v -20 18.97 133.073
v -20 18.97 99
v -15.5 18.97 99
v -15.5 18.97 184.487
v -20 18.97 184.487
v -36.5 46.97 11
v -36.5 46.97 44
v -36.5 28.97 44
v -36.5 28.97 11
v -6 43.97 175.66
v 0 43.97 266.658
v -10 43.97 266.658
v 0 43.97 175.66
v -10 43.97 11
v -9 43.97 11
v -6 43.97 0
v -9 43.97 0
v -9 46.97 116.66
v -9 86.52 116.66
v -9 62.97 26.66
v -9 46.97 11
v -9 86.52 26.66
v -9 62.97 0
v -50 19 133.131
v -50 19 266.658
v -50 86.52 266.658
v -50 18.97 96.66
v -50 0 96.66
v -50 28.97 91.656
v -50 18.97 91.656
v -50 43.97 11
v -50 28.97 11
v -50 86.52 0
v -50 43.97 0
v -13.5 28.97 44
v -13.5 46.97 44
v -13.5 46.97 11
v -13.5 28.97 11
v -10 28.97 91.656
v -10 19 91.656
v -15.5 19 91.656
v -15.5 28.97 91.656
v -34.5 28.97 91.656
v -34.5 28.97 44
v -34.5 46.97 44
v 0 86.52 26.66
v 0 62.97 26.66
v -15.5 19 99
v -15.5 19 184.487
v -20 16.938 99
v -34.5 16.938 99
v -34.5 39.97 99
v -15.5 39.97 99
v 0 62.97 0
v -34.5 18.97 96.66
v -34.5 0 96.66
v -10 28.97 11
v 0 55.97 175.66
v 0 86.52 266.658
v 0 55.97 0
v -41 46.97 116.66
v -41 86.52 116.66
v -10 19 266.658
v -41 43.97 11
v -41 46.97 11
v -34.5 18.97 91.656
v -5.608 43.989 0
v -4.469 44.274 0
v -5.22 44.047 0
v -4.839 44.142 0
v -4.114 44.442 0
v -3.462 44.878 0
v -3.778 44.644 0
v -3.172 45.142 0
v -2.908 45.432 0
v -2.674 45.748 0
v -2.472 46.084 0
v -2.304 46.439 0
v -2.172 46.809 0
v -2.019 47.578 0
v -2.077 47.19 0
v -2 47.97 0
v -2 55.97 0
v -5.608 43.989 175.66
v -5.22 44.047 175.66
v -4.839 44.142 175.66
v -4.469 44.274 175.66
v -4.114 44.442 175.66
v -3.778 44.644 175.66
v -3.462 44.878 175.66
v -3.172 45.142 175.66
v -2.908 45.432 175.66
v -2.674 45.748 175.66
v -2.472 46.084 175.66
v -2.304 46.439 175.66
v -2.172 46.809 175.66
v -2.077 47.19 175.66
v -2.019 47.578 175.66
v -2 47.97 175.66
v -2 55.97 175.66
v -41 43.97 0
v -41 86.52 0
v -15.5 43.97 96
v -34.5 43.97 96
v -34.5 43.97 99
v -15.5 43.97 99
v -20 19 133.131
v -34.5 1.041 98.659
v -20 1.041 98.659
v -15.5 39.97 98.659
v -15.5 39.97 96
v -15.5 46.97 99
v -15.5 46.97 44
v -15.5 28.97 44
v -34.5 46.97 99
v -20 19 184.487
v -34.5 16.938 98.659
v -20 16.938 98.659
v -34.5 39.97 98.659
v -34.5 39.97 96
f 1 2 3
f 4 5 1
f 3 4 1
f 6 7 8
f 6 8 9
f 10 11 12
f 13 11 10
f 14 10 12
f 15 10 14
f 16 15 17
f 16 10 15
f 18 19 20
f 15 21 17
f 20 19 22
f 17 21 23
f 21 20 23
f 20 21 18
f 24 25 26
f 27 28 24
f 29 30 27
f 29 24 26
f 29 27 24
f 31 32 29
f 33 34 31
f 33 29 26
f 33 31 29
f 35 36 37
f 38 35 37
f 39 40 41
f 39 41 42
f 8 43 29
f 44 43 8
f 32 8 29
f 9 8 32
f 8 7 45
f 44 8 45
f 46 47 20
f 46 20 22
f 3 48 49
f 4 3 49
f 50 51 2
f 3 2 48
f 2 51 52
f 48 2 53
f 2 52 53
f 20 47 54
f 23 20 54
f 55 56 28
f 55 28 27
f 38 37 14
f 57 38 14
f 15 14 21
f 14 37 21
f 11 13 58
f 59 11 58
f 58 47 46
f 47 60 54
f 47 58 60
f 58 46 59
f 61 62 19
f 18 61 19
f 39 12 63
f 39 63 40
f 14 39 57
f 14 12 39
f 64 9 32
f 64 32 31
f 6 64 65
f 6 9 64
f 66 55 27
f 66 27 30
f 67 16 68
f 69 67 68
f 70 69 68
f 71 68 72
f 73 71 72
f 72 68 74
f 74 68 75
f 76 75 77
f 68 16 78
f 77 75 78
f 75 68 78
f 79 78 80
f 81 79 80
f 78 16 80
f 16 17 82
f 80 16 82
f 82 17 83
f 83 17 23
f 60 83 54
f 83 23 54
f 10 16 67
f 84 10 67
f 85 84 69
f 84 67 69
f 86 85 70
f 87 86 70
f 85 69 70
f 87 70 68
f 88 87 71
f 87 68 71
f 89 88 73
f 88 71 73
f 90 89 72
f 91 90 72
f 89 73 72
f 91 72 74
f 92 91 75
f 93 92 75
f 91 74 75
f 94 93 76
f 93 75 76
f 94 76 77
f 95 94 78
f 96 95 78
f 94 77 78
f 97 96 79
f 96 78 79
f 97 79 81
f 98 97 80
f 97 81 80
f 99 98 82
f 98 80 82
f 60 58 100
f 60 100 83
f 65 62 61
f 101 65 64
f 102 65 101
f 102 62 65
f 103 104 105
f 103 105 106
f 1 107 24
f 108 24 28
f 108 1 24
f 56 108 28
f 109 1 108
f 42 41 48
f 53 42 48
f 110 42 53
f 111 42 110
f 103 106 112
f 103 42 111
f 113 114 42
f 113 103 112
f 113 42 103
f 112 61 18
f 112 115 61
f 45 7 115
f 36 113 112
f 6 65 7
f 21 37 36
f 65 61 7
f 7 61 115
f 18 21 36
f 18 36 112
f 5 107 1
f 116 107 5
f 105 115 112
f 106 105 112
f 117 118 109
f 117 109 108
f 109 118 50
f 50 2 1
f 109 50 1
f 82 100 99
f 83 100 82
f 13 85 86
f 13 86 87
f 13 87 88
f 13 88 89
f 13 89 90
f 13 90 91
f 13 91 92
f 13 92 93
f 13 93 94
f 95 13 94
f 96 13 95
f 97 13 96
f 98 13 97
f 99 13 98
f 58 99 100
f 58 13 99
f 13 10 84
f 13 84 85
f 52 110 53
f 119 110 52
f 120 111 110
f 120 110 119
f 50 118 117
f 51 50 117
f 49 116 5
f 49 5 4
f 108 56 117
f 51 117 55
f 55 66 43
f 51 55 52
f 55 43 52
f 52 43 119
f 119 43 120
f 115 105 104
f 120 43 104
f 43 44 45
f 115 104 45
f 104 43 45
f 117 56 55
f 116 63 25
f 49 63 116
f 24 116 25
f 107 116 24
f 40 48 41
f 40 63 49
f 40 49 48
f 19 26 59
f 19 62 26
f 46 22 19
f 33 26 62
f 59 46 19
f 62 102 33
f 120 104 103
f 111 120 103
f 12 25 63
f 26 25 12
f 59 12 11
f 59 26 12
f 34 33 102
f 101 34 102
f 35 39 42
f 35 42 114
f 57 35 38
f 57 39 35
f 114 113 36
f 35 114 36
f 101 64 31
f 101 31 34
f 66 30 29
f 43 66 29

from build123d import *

# Parameters (mm, degrees)
SKETCH1_W           = 50
SKETCH1_H           = 86.52
BOSS_EXTRUDE1_DEPTH = 266.658
SKETCH2_W           = 32
SKETCH2_H           = 116.66
CUT_EXTRUDE1_DEPTH  = 39.55
SKETCH3_W           = 32
SKETCH3_H           = 11
CUT_EXTRUDE2_DEPTH  = 276.341006506
SKETCH4_W           = 23
SKETCH4_H           = 33
CUT_EXTRUDE3_DEPTH  = 276.341006506
SKETCH5_W           = 19
SKETCH5_H           = 52
CUT_EXTRUDE4_DEPTH  = 276.341006506
SKETCH6_W           = 19
SKETCH6_H           = 3
CUT_EXTRUDE5_DEPTH  = 3
SKETCH7_W           = 26.66
SKETCH7_H           = 23.55
CUT_EXTRUDE6_DEPTH  = 11
SKETCH8_W           = 96.66
SKETCH8_H           = 18.97
CUT_EXTRUDE7_DEPTH  = 285.76692112
SKETCH9_W           = 80.656
SKETCH9_H           = 10
CUT_EXTRUDE8_DEPTH  = 285.76692112
SKETCH10_W          = 11
SKETCH10_H          = 25
CUT_EXTRUDE9_DEPTH  = 285.76692112
SKETCH11_W          = 175.66
SKETCH11_H          = 55.97
CUT_EXTRUDE10_DEPTH = 2
SKETCH12_W          = 266.658
SKETCH12_H          = 59.418393815
CUT_EXTRUDE11_DEPTH = 10
FILLET2_R           = 4
SKETCH13_W          = 19
SKETCH13_H          = 48.117373491
CUT_EXTRUDE12_DEPTH = 2.659
SKETCH16_W          = 19
SKETCH16_H          = 23.032
CUT_EXTRUDE13_DEPTH = 0.341
CUT_EXTRUDE14_DEPTH = 284.182272334
CUT_EXTRUDE15_DEPTH = 10
SKETCH22_W          = 5.5
SKETCH22_H          = 5.004
CUT_EXTRUDE16_DEPTH = 0.03
SKETCH24_W          = 4.5
SKETCH24_H          = 85.486763268
BOSS_EXTRUDE2_DEPTH = 0.03


with BuildPart() as part:
    # Sketch1 → Boss-Extrude1 (new body)
    with BuildSketch(Plane.XY):
        with Locations((-25, 43.26)):
            Rectangle(SKETCH1_W, SKETCH1_H)
    extrude(amount=BOSS_EXTRUDE1_DEPTH)

    # Sketch2 → Cut-Extrude1 (cut)
    with BuildSketch(Plane(origin=(0, 86.52, 0), x_dir=(1, 0, 0), z_dir=(0, 1, 0))):
        with Locations((-25, -58.33)):
            Rectangle(SKETCH2_W, SKETCH2_H)
    extrude(amount=-CUT_EXTRUDE1_DEPTH, mode=Mode.SUBTRACT)

    # Sketch3 → Cut-Extrude2 (cut, through all)
    with BuildSketch(Plane(origin=(0, 46.97, 0), x_dir=(1, 0, 0), z_dir=(0, 1, 0))):
        with Locations((-25, -5.5)):
            Rectangle(SKETCH3_W, SKETCH3_H)
    extrude(amount=-CUT_EXTRUDE2_DEPTH, mode=Mode.SUBTRACT)

    # Sketch4 → Cut-Extrude3 (cut, through all)
    with BuildSketch(Plane(origin=(0, 46.97, 0), x_dir=(1, 0, 0), z_dir=(0, 1, 0))):
        with Locations((-25, -27.5)):
            Rectangle(SKETCH4_W, SKETCH4_H)
    extrude(amount=-CUT_EXTRUDE3_DEPTH, mode=Mode.SUBTRACT)

    # Sketch5 → Cut-Extrude4 (cut, through all)
    with BuildSketch(Plane(origin=(0, 46.97, 0), x_dir=(1, 0, 0), z_dir=(0, 1, 0))):
        with Locations((-25, -70)):
            Rectangle(SKETCH5_W, SKETCH5_H)
    extrude(amount=-CUT_EXTRUDE4_DEPTH, mode=Mode.SUBTRACT)

    # Sketch6 → Cut-Extrude5 (cut)
    with BuildSketch(Plane(origin=(0, 46.97, 0), x_dir=(1, 0, 0), z_dir=(0, 1, 0))):
        with Locations((-25, -97.5)):
            Rectangle(SKETCH6_W, SKETCH6_H)
    extrude(amount=-CUT_EXTRUDE5_DEPTH, mode=Mode.SUBTRACT)

    # Sketch7 → Cut-Extrude6 (cut)
    with BuildSketch(Plane(origin=(0, 0, 0), x_dir=(0, 0, -1), z_dir=(1, 0, 0))):
        with Locations((-13.33, 74.745)):
            Rectangle(SKETCH7_W, SKETCH7_H)
    extrude(amount=-CUT_EXTRUDE6_DEPTH, mode=Mode.SUBTRACT)

    # Sketch8 → Cut-Extrude7 (cut, through all)
    with BuildSketch(Plane(origin=(0, 0, 0), x_dir=(0, 0, -1), z_dir=(1, 0, 0))):
        with Locations((-48.33, 9.485)):
            Rectangle(SKETCH8_W, SKETCH8_H)
    extrude(amount=-CUT_EXTRUDE7_DEPTH, mode=Mode.SUBTRACT)

    # Sketch9 → Cut-Extrude8 (cut, through all)
    with BuildSketch(Plane(origin=(0, 0, 0), x_dir=(0, 0, -1), z_dir=(1, 0, 0))):
        with Locations((-51.328, 23.97)):
            Rectangle(SKETCH9_W, SKETCH9_H)
    extrude(amount=-CUT_EXTRUDE8_DEPTH, mode=Mode.SUBTRACT)

    # Sketch10 → Cut-Extrude9 (cut, through all)
    with BuildSketch(Plane(origin=(0, 0, 0), x_dir=(0, 0, -1), z_dir=(1, 0, 0))):
        with Locations((-5.5, 31.47)):
            Rectangle(SKETCH10_W, SKETCH10_H)
    extrude(amount=-CUT_EXTRUDE9_DEPTH, mode=Mode.SUBTRACT)

    # Sketch11 → Cut-Extrude10 (cut)
    with BuildSketch(Plane(origin=(0, 0, 0), x_dir=(0, 0, -1), z_dir=(1, 0, 0))):
        with Locations((-87.83, 27.985)):
            Rectangle(SKETCH11_W, SKETCH11_H)
    extrude(amount=-CUT_EXTRUDE10_DEPTH, mode=Mode.SUBTRACT)

    # Sketch12 → Cut-Extrude11 (cut)
    with BuildSketch(Plane(origin=(0, 0, 0), x_dir=(0, 0, -1), z_dir=(1, 0, 0))):
        with Locations((-133.329, 14.260803093)):
            Rectangle(SKETCH12_W, SKETCH12_H)
    extrude(amount=-CUT_EXTRUDE11_DEPTH, mode=Mode.SUBTRACT)

    # Fillet2
    fillet2_edges = [part.edges().sort_by_distance(p)[0] for p in [
        (-2, 43.97, 87.83),
    ]]
    fillet(fillet2_edges, radius=FILLET2_R)

    # Sketch13 → Cut-Extrude12 (cut)
    with BuildSketch(Plane(origin=(0, 0, 96), x_dir=(-1, 0, 0), z_dir=(0, 0, -1))):
        with Locations((25, 15.911313255)):
            Rectangle(SKETCH13_W, SKETCH13_H)
    extrude(amount=-CUT_EXTRUDE12_DEPTH, mode=Mode.SUBTRACT)

    # Sketch16 → Cut-Extrude13 (cut)
    with BuildSketch(Plane(origin=(0, 0, 98.659), x_dir=(-1, 0, 0), z_dir=(0, 0, -1))):
        with Locations((25, 28.454)):
            Rectangle(SKETCH16_W, SKETCH16_H)
    extrude(amount=-CUT_EXTRUDE13_DEPTH, mode=Mode.SUBTRACT)

    # Sketch18 → Cut-Extrude14 (cut, through all)
    with BuildSketch(Plane(origin=(-10, 0, 0), x_dir=(0, 0, -1), z_dir=(1, 0, 0))):
        Polygon((-133.131, 19), (-96.66, 0), (-266.658, 0), (-266.658, 19), align=None)
    extrude(amount=-CUT_EXTRUDE14_DEPTH, mode=Mode.SUBTRACT)

    # Sketch19 → Cut-Extrude15 (cut)
    with BuildSketch(Plane(origin=(-10, 0, 0), x_dir=(0, 0, -1), z_dir=(1, 0, 0))):
        Polygon((-96.66, 0), (-133.131, 19), (-96.66, 19), align=None)
    extrude(amount=-CUT_EXTRUDE15_DEPTH, mode=Mode.SUBTRACT)

    # Sketch22 → Cut-Extrude16 (cut)
    with BuildSketch(Plane.XZ.offset(-18.97)):
        with Locations((-12.75, 94.158)):
            Rectangle(SKETCH22_W, SKETCH22_H)
    extrude(amount=-CUT_EXTRUDE16_DEPTH, mode=Mode.SUBTRACT)

    # Sketch24 → Boss-Extrude2 (add)
    with BuildSketch(Plane.XZ.offset(-19)):
        with Locations((-17.75, 141.743381634)):
            Rectangle(SKETCH24_W, SKETCH24_H)
    extrude(amount=BOSS_EXTRUDE2_DEPTH)


solid = part.part
